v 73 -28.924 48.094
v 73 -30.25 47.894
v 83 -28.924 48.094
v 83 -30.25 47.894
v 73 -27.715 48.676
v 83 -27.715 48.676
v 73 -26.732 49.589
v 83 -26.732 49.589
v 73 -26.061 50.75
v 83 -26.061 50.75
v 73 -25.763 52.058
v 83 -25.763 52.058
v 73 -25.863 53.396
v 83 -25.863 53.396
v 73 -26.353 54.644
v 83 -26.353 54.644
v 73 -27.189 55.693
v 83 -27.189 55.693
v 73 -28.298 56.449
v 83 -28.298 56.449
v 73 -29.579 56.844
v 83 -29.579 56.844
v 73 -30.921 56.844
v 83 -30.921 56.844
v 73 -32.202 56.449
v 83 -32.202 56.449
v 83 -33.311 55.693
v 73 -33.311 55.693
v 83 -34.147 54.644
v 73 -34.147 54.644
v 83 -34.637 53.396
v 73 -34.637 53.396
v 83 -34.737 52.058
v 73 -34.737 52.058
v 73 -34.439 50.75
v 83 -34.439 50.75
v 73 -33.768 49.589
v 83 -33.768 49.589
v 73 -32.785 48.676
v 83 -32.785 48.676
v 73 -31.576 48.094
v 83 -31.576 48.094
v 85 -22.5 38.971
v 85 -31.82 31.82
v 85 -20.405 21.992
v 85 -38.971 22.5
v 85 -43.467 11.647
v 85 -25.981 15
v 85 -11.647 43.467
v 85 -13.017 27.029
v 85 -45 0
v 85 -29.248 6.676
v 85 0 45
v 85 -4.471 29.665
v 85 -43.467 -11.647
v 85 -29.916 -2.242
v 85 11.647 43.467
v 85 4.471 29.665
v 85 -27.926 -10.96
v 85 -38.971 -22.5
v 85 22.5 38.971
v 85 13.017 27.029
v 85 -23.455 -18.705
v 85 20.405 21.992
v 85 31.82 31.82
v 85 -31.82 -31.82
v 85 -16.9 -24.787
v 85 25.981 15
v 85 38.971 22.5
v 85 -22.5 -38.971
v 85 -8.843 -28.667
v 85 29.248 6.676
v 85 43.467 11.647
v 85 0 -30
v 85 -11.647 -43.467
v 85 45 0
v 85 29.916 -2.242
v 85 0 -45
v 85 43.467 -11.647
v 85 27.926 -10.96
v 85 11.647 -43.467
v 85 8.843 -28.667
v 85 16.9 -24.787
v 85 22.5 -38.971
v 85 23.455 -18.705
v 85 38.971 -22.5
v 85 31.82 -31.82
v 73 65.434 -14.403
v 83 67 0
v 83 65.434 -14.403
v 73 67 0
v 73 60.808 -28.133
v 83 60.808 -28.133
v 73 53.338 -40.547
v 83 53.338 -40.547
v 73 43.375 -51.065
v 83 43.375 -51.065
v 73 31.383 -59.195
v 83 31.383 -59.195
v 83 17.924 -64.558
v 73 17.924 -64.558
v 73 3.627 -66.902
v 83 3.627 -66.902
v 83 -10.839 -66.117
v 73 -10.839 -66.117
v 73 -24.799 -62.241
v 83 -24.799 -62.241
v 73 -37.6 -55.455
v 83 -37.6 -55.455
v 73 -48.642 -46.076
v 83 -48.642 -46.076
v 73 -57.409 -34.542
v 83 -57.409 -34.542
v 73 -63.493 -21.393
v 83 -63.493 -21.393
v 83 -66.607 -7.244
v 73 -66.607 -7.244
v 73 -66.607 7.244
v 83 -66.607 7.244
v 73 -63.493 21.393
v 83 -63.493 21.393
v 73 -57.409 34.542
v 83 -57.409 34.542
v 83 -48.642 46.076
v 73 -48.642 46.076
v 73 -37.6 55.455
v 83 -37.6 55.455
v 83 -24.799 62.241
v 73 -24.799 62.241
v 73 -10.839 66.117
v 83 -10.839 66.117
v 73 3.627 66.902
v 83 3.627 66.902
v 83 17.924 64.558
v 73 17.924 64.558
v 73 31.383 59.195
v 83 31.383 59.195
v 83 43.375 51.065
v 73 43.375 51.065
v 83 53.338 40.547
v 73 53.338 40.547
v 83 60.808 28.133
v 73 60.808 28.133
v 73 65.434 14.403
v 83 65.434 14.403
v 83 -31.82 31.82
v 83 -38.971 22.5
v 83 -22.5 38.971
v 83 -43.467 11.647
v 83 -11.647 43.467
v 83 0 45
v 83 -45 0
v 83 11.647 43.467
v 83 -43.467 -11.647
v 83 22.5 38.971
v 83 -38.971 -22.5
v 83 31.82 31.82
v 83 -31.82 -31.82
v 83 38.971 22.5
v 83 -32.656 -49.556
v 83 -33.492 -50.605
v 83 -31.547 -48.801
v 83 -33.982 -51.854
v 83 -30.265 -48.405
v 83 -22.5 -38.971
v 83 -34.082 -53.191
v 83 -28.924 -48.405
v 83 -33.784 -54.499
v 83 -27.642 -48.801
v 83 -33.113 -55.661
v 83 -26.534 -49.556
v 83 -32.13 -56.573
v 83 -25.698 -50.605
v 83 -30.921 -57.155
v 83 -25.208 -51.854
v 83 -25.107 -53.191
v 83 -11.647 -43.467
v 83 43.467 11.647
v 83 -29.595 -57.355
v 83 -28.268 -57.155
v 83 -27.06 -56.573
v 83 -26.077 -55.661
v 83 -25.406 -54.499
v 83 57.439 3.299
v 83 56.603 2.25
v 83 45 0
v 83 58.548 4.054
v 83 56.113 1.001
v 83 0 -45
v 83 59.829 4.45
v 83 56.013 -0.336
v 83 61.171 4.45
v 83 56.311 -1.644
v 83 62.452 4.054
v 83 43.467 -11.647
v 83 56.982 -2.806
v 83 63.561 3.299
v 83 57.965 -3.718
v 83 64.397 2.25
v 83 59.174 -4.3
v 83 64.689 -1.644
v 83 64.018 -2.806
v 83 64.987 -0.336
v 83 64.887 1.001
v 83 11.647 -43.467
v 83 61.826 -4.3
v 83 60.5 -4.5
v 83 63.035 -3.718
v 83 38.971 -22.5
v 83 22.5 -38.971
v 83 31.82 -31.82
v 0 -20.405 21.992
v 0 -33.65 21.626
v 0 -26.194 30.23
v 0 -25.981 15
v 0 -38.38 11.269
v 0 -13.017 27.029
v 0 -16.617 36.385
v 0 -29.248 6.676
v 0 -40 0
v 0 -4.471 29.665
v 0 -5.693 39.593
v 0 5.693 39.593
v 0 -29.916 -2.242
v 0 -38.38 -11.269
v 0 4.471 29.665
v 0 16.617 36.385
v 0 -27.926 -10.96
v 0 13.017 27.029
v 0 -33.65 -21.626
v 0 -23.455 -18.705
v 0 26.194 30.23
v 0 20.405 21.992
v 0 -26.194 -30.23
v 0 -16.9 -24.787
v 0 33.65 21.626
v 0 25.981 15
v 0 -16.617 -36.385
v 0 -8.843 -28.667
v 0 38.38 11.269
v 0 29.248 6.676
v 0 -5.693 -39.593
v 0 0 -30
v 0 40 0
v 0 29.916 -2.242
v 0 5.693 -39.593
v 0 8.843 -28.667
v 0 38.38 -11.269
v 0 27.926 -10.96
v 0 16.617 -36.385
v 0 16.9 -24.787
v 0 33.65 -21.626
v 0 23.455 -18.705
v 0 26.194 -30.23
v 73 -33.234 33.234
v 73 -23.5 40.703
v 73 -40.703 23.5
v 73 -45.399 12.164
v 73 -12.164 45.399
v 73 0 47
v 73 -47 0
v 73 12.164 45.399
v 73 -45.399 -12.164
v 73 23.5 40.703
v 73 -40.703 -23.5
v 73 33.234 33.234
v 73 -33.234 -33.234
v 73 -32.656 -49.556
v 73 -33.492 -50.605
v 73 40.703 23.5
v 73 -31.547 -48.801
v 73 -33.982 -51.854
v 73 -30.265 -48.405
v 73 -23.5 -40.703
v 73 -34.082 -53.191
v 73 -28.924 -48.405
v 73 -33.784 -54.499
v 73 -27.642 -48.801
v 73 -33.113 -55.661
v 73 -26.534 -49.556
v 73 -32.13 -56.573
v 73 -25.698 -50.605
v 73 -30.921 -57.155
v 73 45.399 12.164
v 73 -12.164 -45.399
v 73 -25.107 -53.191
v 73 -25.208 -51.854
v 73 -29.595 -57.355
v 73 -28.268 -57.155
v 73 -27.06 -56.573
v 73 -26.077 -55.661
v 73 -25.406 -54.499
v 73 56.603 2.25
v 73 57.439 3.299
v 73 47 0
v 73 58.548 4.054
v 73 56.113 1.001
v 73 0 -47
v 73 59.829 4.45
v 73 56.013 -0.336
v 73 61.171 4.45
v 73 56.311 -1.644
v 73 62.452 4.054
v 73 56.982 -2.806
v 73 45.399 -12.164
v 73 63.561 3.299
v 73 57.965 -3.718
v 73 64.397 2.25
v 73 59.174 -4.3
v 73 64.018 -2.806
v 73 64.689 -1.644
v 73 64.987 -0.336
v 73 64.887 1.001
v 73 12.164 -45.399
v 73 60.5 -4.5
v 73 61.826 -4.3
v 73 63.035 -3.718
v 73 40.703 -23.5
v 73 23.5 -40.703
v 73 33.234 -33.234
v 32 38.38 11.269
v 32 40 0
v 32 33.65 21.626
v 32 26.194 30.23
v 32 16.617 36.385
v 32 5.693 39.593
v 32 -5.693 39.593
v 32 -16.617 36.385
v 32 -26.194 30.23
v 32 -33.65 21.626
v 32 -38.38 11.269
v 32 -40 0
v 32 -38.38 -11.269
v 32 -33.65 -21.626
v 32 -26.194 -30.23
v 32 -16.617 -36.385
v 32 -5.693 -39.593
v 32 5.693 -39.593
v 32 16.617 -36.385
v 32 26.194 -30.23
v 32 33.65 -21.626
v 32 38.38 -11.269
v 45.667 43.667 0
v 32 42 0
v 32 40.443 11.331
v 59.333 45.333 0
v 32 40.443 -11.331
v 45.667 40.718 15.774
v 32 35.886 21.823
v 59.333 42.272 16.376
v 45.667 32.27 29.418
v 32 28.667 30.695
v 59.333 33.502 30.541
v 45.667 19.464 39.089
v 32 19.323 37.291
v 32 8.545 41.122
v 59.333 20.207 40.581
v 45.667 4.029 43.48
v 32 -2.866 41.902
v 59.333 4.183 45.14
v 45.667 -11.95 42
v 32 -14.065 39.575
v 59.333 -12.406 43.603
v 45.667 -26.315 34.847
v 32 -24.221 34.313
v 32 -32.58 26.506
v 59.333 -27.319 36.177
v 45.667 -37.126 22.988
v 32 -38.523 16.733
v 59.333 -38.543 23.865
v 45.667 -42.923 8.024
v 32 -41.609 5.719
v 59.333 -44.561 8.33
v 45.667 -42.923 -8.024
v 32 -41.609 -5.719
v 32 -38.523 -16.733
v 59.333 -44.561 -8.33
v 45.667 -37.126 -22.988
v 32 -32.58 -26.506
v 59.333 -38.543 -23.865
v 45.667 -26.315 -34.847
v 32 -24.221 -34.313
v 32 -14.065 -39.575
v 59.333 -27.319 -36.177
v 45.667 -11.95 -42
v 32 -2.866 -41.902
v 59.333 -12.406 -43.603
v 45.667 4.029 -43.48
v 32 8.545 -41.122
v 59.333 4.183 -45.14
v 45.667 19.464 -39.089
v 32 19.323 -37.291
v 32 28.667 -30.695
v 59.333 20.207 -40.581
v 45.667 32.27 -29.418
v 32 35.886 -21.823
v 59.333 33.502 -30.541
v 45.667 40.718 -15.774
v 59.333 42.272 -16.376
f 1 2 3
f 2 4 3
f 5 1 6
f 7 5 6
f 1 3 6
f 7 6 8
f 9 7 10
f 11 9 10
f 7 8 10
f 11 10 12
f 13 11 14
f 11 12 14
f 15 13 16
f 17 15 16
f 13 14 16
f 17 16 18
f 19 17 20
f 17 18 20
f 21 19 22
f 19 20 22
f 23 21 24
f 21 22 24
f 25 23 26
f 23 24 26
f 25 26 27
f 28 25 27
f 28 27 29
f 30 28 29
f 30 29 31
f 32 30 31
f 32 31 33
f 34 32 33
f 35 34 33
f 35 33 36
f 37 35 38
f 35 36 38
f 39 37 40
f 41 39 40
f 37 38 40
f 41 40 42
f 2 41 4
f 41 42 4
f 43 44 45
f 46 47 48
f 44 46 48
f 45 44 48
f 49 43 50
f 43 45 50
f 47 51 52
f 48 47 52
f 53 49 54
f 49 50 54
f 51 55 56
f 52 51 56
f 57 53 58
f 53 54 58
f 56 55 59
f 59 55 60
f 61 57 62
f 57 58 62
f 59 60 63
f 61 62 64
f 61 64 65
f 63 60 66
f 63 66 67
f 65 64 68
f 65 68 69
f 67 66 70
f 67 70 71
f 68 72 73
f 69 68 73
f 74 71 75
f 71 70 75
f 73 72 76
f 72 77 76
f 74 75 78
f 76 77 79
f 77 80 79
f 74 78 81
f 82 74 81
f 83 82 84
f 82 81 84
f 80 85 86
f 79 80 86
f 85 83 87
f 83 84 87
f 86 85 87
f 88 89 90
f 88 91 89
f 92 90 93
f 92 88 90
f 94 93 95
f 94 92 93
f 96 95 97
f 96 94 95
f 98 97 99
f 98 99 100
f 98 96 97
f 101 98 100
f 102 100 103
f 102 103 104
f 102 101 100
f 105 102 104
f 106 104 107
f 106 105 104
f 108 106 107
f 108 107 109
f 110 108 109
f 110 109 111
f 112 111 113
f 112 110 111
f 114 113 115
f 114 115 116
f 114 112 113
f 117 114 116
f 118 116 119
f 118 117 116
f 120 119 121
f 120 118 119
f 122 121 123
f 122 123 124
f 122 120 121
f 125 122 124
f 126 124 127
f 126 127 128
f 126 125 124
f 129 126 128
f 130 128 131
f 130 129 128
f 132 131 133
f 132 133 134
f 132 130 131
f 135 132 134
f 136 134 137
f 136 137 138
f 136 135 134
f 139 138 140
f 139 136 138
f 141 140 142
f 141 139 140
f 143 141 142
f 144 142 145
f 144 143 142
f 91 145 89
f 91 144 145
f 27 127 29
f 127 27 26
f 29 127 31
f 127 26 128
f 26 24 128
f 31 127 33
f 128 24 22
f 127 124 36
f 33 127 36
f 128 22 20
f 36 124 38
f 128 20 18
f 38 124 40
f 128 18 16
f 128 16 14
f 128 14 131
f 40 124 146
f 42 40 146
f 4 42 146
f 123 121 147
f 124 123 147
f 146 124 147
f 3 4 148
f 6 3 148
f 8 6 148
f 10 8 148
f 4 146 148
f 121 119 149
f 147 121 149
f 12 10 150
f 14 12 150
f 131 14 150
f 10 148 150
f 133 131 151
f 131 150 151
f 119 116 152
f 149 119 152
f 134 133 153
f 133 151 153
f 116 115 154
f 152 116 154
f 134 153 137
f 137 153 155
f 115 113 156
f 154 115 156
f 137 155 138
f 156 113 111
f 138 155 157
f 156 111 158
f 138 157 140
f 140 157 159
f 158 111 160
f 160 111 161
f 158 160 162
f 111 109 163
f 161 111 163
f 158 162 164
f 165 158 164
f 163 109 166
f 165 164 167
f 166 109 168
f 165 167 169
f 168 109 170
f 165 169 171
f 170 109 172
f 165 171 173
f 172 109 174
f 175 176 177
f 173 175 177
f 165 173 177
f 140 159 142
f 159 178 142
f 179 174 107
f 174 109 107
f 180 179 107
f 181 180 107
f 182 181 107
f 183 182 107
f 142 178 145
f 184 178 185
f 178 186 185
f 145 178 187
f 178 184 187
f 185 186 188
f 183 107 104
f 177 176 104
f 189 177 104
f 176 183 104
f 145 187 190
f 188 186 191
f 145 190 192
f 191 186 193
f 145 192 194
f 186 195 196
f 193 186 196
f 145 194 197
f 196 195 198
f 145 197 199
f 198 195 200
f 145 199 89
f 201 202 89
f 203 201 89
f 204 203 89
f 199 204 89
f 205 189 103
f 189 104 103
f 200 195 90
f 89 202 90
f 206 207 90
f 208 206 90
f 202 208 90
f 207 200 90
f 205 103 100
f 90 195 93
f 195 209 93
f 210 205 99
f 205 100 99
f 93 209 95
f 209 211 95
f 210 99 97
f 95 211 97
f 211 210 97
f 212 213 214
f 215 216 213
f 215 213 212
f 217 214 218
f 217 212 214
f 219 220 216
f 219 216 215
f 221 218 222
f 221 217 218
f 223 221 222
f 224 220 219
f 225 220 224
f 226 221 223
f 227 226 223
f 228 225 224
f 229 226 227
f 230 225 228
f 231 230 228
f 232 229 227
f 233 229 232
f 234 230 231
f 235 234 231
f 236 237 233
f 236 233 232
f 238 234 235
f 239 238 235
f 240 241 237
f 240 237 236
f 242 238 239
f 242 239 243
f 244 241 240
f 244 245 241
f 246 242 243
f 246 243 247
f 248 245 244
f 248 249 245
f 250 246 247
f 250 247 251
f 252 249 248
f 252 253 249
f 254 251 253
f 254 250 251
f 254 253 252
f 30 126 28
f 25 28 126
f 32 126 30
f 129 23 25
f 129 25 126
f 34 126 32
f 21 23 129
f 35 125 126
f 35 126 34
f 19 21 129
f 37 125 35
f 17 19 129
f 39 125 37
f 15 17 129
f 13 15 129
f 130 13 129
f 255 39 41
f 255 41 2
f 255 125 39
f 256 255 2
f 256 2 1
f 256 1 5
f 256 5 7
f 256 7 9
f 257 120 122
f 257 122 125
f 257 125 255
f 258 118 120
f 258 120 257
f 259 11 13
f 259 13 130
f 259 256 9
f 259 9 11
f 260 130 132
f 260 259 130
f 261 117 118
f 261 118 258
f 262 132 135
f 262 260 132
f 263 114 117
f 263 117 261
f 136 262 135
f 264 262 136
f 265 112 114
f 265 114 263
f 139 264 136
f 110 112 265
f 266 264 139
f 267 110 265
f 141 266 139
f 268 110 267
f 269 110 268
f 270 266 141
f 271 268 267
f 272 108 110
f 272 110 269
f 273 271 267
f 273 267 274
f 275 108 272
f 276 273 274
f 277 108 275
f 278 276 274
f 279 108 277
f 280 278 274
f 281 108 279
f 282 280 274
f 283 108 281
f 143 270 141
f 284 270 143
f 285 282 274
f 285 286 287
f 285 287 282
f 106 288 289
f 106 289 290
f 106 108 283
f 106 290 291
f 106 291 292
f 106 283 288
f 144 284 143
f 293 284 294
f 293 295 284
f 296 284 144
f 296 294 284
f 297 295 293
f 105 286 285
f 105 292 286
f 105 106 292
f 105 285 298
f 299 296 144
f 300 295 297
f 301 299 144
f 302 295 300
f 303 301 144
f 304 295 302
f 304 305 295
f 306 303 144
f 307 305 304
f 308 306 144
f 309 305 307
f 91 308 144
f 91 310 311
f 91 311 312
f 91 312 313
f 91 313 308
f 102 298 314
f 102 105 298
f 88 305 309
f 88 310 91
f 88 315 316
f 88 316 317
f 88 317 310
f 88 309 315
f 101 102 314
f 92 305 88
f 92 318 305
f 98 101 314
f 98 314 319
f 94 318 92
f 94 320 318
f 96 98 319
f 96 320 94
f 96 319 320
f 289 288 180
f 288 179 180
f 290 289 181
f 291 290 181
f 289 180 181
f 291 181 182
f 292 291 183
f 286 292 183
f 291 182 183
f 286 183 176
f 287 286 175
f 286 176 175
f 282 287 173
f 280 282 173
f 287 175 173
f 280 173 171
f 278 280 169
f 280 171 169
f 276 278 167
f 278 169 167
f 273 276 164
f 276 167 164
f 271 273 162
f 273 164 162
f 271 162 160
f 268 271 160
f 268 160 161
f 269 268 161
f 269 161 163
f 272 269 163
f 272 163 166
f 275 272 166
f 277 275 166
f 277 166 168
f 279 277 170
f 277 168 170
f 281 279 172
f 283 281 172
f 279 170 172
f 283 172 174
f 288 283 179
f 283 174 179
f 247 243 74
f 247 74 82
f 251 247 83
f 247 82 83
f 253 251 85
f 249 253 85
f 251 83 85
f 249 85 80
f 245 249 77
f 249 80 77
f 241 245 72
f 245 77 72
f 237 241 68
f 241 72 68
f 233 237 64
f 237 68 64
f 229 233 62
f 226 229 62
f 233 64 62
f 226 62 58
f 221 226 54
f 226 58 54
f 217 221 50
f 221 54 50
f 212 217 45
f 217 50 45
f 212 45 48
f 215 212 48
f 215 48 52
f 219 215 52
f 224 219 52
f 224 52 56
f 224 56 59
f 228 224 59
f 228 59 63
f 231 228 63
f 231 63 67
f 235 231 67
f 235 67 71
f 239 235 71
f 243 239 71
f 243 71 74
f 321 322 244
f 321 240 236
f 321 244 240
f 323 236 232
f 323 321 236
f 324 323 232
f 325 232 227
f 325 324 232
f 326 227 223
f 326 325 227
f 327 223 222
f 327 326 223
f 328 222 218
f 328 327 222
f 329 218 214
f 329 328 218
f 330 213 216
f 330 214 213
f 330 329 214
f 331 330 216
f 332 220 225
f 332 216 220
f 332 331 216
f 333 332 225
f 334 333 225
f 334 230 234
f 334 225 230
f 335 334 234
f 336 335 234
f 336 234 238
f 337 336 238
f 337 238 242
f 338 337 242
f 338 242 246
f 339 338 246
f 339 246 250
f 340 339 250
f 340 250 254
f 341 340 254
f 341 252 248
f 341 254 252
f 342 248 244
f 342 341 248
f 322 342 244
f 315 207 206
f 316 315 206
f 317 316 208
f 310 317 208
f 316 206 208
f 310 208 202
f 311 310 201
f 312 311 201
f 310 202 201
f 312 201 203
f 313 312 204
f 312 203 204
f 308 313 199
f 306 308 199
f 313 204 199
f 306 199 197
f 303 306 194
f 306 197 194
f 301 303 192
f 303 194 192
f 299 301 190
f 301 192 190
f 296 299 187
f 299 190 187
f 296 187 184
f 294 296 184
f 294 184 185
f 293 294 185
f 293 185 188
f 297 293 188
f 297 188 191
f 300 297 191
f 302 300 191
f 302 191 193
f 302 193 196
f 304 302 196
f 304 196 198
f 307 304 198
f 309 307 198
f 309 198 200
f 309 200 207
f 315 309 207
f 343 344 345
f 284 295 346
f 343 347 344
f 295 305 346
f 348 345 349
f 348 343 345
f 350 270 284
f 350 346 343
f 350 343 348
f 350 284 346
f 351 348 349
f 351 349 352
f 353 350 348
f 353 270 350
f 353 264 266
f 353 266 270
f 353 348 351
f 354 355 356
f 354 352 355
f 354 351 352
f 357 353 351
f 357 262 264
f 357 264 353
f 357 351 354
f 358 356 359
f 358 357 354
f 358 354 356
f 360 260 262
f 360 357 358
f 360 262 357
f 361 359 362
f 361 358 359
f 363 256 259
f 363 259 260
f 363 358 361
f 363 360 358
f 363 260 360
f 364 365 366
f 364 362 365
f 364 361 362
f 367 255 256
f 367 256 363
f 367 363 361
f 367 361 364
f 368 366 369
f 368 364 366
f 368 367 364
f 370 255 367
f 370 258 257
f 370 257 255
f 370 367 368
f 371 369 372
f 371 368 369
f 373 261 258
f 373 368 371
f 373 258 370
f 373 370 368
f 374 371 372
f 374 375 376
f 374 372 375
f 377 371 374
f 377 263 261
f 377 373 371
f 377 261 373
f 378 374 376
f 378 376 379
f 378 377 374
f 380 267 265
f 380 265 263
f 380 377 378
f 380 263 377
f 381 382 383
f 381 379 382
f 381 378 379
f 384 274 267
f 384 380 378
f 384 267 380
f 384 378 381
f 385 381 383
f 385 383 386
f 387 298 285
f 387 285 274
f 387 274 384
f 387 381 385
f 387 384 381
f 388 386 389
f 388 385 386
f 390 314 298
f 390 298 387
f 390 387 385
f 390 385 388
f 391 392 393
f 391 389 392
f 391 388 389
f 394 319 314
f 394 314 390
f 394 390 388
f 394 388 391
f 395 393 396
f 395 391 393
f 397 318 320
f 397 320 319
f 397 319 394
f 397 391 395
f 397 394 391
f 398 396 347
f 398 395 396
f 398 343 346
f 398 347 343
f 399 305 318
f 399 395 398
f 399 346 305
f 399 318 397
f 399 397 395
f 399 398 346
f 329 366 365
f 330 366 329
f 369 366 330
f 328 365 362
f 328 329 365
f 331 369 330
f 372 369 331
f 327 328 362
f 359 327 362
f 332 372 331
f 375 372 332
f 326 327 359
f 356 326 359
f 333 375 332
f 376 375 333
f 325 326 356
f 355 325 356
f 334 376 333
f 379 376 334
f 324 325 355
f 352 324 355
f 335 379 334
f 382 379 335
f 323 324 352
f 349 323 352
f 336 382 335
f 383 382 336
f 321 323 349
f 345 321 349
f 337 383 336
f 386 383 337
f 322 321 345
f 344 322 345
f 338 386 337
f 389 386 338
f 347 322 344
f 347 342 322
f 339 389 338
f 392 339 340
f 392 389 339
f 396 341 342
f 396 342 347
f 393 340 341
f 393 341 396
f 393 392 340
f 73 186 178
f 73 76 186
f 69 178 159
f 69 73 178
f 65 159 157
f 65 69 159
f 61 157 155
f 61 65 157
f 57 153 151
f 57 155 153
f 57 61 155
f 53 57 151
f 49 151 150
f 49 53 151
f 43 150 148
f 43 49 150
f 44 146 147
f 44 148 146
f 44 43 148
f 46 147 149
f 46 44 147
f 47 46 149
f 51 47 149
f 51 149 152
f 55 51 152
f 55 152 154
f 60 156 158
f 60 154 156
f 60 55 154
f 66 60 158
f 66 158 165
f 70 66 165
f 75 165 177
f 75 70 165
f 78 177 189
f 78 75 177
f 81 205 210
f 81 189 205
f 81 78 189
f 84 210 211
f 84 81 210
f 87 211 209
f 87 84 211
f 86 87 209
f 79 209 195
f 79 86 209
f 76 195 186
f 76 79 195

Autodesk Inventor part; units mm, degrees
ref_plane "YZ Plane" through (0, 0, 0) normal (1, 0, 0) x (0, 1, 0)
ref_plane "XZ Plane" through (0, 0, 0) normal (0, 1, 0) x (-1, 0, 0)
ref_plane "XY Plane" through (0, 0, 0) normal (0, 0, 1) x (1, 0, 0)
sketch "Sketch1" plane through (0, 0, 0) normal (0, 0, 1) x (1, 0, 0)
  line L0 (0, 0) -> (0, 40)
  line L1 (0, 40) -> (32, 40)
  line L2 (32, 40) -> (32, 42)
  line L3 (73, 67) -> (73, 47)
  line L4 (73, 47) -> (32, 42)
  line L5 (83, 67) -> (83, 45)
  line L6 (83, 45) -> (85, 45)
  line L7 (83, 67) -> (73, 67)
  line L8 (85, 0) -> (0, 0)
  line L9 (85, 45) -> (85, 0)
  dimension "d1" = 40
  dimension "d2" = 32
  dimension "d4" = 10
  dimension "d5" = 2
  dimension "d6" = 20
  dimension "d9" = 22
  dimension "d10" = 2
  dimension "d11" = 85
revolve "Revolution1" add sketch "Sketch1" angle 360 about axis through (85, 0, 0) along (-1, 0, 0)
sketch "Sketch2" plane through (85, 0, 0) normal (1, 0, 0) x (0, 0, -1)
  circle A0 centre (0, 0) radius 30
  dimension "d13" = 60
extrude "Extrusion1" cut sketch "Sketch2" against normal blind 86
sketch "Sketch3" plane through (85, 0, 0) normal (1, 0, 0) x (0, 0, -1)
  circle A0 centre (0, 60.5) radius 4.5
  circle A1 centre (52.8551, -29.5948) radius 4.5
  circle A2 centre (-52.3945, -30.25) radius 4.5
  circle A3 centre (0, 0) radius 47 projected
  circle A4 centre (0, 0) radius 67 projected
  line L0 (58.0237, -33.5) -> (56.2917, -32.5)
  dimension "d17" = 9
  dimension "d16" = 9
  dimension "d18" = 9
  dimension "d23" = 2
sketch "Sketch4" plane through (83, 0, 0) normal (1, 0, 0) x (0, 0, -1)
  point P0 (0, 0)
extrude "Extrusion2" cut sketch "Sketch3" against normal blind 86 contours A0 | A1 | A2
properties part number "parte eixo"
